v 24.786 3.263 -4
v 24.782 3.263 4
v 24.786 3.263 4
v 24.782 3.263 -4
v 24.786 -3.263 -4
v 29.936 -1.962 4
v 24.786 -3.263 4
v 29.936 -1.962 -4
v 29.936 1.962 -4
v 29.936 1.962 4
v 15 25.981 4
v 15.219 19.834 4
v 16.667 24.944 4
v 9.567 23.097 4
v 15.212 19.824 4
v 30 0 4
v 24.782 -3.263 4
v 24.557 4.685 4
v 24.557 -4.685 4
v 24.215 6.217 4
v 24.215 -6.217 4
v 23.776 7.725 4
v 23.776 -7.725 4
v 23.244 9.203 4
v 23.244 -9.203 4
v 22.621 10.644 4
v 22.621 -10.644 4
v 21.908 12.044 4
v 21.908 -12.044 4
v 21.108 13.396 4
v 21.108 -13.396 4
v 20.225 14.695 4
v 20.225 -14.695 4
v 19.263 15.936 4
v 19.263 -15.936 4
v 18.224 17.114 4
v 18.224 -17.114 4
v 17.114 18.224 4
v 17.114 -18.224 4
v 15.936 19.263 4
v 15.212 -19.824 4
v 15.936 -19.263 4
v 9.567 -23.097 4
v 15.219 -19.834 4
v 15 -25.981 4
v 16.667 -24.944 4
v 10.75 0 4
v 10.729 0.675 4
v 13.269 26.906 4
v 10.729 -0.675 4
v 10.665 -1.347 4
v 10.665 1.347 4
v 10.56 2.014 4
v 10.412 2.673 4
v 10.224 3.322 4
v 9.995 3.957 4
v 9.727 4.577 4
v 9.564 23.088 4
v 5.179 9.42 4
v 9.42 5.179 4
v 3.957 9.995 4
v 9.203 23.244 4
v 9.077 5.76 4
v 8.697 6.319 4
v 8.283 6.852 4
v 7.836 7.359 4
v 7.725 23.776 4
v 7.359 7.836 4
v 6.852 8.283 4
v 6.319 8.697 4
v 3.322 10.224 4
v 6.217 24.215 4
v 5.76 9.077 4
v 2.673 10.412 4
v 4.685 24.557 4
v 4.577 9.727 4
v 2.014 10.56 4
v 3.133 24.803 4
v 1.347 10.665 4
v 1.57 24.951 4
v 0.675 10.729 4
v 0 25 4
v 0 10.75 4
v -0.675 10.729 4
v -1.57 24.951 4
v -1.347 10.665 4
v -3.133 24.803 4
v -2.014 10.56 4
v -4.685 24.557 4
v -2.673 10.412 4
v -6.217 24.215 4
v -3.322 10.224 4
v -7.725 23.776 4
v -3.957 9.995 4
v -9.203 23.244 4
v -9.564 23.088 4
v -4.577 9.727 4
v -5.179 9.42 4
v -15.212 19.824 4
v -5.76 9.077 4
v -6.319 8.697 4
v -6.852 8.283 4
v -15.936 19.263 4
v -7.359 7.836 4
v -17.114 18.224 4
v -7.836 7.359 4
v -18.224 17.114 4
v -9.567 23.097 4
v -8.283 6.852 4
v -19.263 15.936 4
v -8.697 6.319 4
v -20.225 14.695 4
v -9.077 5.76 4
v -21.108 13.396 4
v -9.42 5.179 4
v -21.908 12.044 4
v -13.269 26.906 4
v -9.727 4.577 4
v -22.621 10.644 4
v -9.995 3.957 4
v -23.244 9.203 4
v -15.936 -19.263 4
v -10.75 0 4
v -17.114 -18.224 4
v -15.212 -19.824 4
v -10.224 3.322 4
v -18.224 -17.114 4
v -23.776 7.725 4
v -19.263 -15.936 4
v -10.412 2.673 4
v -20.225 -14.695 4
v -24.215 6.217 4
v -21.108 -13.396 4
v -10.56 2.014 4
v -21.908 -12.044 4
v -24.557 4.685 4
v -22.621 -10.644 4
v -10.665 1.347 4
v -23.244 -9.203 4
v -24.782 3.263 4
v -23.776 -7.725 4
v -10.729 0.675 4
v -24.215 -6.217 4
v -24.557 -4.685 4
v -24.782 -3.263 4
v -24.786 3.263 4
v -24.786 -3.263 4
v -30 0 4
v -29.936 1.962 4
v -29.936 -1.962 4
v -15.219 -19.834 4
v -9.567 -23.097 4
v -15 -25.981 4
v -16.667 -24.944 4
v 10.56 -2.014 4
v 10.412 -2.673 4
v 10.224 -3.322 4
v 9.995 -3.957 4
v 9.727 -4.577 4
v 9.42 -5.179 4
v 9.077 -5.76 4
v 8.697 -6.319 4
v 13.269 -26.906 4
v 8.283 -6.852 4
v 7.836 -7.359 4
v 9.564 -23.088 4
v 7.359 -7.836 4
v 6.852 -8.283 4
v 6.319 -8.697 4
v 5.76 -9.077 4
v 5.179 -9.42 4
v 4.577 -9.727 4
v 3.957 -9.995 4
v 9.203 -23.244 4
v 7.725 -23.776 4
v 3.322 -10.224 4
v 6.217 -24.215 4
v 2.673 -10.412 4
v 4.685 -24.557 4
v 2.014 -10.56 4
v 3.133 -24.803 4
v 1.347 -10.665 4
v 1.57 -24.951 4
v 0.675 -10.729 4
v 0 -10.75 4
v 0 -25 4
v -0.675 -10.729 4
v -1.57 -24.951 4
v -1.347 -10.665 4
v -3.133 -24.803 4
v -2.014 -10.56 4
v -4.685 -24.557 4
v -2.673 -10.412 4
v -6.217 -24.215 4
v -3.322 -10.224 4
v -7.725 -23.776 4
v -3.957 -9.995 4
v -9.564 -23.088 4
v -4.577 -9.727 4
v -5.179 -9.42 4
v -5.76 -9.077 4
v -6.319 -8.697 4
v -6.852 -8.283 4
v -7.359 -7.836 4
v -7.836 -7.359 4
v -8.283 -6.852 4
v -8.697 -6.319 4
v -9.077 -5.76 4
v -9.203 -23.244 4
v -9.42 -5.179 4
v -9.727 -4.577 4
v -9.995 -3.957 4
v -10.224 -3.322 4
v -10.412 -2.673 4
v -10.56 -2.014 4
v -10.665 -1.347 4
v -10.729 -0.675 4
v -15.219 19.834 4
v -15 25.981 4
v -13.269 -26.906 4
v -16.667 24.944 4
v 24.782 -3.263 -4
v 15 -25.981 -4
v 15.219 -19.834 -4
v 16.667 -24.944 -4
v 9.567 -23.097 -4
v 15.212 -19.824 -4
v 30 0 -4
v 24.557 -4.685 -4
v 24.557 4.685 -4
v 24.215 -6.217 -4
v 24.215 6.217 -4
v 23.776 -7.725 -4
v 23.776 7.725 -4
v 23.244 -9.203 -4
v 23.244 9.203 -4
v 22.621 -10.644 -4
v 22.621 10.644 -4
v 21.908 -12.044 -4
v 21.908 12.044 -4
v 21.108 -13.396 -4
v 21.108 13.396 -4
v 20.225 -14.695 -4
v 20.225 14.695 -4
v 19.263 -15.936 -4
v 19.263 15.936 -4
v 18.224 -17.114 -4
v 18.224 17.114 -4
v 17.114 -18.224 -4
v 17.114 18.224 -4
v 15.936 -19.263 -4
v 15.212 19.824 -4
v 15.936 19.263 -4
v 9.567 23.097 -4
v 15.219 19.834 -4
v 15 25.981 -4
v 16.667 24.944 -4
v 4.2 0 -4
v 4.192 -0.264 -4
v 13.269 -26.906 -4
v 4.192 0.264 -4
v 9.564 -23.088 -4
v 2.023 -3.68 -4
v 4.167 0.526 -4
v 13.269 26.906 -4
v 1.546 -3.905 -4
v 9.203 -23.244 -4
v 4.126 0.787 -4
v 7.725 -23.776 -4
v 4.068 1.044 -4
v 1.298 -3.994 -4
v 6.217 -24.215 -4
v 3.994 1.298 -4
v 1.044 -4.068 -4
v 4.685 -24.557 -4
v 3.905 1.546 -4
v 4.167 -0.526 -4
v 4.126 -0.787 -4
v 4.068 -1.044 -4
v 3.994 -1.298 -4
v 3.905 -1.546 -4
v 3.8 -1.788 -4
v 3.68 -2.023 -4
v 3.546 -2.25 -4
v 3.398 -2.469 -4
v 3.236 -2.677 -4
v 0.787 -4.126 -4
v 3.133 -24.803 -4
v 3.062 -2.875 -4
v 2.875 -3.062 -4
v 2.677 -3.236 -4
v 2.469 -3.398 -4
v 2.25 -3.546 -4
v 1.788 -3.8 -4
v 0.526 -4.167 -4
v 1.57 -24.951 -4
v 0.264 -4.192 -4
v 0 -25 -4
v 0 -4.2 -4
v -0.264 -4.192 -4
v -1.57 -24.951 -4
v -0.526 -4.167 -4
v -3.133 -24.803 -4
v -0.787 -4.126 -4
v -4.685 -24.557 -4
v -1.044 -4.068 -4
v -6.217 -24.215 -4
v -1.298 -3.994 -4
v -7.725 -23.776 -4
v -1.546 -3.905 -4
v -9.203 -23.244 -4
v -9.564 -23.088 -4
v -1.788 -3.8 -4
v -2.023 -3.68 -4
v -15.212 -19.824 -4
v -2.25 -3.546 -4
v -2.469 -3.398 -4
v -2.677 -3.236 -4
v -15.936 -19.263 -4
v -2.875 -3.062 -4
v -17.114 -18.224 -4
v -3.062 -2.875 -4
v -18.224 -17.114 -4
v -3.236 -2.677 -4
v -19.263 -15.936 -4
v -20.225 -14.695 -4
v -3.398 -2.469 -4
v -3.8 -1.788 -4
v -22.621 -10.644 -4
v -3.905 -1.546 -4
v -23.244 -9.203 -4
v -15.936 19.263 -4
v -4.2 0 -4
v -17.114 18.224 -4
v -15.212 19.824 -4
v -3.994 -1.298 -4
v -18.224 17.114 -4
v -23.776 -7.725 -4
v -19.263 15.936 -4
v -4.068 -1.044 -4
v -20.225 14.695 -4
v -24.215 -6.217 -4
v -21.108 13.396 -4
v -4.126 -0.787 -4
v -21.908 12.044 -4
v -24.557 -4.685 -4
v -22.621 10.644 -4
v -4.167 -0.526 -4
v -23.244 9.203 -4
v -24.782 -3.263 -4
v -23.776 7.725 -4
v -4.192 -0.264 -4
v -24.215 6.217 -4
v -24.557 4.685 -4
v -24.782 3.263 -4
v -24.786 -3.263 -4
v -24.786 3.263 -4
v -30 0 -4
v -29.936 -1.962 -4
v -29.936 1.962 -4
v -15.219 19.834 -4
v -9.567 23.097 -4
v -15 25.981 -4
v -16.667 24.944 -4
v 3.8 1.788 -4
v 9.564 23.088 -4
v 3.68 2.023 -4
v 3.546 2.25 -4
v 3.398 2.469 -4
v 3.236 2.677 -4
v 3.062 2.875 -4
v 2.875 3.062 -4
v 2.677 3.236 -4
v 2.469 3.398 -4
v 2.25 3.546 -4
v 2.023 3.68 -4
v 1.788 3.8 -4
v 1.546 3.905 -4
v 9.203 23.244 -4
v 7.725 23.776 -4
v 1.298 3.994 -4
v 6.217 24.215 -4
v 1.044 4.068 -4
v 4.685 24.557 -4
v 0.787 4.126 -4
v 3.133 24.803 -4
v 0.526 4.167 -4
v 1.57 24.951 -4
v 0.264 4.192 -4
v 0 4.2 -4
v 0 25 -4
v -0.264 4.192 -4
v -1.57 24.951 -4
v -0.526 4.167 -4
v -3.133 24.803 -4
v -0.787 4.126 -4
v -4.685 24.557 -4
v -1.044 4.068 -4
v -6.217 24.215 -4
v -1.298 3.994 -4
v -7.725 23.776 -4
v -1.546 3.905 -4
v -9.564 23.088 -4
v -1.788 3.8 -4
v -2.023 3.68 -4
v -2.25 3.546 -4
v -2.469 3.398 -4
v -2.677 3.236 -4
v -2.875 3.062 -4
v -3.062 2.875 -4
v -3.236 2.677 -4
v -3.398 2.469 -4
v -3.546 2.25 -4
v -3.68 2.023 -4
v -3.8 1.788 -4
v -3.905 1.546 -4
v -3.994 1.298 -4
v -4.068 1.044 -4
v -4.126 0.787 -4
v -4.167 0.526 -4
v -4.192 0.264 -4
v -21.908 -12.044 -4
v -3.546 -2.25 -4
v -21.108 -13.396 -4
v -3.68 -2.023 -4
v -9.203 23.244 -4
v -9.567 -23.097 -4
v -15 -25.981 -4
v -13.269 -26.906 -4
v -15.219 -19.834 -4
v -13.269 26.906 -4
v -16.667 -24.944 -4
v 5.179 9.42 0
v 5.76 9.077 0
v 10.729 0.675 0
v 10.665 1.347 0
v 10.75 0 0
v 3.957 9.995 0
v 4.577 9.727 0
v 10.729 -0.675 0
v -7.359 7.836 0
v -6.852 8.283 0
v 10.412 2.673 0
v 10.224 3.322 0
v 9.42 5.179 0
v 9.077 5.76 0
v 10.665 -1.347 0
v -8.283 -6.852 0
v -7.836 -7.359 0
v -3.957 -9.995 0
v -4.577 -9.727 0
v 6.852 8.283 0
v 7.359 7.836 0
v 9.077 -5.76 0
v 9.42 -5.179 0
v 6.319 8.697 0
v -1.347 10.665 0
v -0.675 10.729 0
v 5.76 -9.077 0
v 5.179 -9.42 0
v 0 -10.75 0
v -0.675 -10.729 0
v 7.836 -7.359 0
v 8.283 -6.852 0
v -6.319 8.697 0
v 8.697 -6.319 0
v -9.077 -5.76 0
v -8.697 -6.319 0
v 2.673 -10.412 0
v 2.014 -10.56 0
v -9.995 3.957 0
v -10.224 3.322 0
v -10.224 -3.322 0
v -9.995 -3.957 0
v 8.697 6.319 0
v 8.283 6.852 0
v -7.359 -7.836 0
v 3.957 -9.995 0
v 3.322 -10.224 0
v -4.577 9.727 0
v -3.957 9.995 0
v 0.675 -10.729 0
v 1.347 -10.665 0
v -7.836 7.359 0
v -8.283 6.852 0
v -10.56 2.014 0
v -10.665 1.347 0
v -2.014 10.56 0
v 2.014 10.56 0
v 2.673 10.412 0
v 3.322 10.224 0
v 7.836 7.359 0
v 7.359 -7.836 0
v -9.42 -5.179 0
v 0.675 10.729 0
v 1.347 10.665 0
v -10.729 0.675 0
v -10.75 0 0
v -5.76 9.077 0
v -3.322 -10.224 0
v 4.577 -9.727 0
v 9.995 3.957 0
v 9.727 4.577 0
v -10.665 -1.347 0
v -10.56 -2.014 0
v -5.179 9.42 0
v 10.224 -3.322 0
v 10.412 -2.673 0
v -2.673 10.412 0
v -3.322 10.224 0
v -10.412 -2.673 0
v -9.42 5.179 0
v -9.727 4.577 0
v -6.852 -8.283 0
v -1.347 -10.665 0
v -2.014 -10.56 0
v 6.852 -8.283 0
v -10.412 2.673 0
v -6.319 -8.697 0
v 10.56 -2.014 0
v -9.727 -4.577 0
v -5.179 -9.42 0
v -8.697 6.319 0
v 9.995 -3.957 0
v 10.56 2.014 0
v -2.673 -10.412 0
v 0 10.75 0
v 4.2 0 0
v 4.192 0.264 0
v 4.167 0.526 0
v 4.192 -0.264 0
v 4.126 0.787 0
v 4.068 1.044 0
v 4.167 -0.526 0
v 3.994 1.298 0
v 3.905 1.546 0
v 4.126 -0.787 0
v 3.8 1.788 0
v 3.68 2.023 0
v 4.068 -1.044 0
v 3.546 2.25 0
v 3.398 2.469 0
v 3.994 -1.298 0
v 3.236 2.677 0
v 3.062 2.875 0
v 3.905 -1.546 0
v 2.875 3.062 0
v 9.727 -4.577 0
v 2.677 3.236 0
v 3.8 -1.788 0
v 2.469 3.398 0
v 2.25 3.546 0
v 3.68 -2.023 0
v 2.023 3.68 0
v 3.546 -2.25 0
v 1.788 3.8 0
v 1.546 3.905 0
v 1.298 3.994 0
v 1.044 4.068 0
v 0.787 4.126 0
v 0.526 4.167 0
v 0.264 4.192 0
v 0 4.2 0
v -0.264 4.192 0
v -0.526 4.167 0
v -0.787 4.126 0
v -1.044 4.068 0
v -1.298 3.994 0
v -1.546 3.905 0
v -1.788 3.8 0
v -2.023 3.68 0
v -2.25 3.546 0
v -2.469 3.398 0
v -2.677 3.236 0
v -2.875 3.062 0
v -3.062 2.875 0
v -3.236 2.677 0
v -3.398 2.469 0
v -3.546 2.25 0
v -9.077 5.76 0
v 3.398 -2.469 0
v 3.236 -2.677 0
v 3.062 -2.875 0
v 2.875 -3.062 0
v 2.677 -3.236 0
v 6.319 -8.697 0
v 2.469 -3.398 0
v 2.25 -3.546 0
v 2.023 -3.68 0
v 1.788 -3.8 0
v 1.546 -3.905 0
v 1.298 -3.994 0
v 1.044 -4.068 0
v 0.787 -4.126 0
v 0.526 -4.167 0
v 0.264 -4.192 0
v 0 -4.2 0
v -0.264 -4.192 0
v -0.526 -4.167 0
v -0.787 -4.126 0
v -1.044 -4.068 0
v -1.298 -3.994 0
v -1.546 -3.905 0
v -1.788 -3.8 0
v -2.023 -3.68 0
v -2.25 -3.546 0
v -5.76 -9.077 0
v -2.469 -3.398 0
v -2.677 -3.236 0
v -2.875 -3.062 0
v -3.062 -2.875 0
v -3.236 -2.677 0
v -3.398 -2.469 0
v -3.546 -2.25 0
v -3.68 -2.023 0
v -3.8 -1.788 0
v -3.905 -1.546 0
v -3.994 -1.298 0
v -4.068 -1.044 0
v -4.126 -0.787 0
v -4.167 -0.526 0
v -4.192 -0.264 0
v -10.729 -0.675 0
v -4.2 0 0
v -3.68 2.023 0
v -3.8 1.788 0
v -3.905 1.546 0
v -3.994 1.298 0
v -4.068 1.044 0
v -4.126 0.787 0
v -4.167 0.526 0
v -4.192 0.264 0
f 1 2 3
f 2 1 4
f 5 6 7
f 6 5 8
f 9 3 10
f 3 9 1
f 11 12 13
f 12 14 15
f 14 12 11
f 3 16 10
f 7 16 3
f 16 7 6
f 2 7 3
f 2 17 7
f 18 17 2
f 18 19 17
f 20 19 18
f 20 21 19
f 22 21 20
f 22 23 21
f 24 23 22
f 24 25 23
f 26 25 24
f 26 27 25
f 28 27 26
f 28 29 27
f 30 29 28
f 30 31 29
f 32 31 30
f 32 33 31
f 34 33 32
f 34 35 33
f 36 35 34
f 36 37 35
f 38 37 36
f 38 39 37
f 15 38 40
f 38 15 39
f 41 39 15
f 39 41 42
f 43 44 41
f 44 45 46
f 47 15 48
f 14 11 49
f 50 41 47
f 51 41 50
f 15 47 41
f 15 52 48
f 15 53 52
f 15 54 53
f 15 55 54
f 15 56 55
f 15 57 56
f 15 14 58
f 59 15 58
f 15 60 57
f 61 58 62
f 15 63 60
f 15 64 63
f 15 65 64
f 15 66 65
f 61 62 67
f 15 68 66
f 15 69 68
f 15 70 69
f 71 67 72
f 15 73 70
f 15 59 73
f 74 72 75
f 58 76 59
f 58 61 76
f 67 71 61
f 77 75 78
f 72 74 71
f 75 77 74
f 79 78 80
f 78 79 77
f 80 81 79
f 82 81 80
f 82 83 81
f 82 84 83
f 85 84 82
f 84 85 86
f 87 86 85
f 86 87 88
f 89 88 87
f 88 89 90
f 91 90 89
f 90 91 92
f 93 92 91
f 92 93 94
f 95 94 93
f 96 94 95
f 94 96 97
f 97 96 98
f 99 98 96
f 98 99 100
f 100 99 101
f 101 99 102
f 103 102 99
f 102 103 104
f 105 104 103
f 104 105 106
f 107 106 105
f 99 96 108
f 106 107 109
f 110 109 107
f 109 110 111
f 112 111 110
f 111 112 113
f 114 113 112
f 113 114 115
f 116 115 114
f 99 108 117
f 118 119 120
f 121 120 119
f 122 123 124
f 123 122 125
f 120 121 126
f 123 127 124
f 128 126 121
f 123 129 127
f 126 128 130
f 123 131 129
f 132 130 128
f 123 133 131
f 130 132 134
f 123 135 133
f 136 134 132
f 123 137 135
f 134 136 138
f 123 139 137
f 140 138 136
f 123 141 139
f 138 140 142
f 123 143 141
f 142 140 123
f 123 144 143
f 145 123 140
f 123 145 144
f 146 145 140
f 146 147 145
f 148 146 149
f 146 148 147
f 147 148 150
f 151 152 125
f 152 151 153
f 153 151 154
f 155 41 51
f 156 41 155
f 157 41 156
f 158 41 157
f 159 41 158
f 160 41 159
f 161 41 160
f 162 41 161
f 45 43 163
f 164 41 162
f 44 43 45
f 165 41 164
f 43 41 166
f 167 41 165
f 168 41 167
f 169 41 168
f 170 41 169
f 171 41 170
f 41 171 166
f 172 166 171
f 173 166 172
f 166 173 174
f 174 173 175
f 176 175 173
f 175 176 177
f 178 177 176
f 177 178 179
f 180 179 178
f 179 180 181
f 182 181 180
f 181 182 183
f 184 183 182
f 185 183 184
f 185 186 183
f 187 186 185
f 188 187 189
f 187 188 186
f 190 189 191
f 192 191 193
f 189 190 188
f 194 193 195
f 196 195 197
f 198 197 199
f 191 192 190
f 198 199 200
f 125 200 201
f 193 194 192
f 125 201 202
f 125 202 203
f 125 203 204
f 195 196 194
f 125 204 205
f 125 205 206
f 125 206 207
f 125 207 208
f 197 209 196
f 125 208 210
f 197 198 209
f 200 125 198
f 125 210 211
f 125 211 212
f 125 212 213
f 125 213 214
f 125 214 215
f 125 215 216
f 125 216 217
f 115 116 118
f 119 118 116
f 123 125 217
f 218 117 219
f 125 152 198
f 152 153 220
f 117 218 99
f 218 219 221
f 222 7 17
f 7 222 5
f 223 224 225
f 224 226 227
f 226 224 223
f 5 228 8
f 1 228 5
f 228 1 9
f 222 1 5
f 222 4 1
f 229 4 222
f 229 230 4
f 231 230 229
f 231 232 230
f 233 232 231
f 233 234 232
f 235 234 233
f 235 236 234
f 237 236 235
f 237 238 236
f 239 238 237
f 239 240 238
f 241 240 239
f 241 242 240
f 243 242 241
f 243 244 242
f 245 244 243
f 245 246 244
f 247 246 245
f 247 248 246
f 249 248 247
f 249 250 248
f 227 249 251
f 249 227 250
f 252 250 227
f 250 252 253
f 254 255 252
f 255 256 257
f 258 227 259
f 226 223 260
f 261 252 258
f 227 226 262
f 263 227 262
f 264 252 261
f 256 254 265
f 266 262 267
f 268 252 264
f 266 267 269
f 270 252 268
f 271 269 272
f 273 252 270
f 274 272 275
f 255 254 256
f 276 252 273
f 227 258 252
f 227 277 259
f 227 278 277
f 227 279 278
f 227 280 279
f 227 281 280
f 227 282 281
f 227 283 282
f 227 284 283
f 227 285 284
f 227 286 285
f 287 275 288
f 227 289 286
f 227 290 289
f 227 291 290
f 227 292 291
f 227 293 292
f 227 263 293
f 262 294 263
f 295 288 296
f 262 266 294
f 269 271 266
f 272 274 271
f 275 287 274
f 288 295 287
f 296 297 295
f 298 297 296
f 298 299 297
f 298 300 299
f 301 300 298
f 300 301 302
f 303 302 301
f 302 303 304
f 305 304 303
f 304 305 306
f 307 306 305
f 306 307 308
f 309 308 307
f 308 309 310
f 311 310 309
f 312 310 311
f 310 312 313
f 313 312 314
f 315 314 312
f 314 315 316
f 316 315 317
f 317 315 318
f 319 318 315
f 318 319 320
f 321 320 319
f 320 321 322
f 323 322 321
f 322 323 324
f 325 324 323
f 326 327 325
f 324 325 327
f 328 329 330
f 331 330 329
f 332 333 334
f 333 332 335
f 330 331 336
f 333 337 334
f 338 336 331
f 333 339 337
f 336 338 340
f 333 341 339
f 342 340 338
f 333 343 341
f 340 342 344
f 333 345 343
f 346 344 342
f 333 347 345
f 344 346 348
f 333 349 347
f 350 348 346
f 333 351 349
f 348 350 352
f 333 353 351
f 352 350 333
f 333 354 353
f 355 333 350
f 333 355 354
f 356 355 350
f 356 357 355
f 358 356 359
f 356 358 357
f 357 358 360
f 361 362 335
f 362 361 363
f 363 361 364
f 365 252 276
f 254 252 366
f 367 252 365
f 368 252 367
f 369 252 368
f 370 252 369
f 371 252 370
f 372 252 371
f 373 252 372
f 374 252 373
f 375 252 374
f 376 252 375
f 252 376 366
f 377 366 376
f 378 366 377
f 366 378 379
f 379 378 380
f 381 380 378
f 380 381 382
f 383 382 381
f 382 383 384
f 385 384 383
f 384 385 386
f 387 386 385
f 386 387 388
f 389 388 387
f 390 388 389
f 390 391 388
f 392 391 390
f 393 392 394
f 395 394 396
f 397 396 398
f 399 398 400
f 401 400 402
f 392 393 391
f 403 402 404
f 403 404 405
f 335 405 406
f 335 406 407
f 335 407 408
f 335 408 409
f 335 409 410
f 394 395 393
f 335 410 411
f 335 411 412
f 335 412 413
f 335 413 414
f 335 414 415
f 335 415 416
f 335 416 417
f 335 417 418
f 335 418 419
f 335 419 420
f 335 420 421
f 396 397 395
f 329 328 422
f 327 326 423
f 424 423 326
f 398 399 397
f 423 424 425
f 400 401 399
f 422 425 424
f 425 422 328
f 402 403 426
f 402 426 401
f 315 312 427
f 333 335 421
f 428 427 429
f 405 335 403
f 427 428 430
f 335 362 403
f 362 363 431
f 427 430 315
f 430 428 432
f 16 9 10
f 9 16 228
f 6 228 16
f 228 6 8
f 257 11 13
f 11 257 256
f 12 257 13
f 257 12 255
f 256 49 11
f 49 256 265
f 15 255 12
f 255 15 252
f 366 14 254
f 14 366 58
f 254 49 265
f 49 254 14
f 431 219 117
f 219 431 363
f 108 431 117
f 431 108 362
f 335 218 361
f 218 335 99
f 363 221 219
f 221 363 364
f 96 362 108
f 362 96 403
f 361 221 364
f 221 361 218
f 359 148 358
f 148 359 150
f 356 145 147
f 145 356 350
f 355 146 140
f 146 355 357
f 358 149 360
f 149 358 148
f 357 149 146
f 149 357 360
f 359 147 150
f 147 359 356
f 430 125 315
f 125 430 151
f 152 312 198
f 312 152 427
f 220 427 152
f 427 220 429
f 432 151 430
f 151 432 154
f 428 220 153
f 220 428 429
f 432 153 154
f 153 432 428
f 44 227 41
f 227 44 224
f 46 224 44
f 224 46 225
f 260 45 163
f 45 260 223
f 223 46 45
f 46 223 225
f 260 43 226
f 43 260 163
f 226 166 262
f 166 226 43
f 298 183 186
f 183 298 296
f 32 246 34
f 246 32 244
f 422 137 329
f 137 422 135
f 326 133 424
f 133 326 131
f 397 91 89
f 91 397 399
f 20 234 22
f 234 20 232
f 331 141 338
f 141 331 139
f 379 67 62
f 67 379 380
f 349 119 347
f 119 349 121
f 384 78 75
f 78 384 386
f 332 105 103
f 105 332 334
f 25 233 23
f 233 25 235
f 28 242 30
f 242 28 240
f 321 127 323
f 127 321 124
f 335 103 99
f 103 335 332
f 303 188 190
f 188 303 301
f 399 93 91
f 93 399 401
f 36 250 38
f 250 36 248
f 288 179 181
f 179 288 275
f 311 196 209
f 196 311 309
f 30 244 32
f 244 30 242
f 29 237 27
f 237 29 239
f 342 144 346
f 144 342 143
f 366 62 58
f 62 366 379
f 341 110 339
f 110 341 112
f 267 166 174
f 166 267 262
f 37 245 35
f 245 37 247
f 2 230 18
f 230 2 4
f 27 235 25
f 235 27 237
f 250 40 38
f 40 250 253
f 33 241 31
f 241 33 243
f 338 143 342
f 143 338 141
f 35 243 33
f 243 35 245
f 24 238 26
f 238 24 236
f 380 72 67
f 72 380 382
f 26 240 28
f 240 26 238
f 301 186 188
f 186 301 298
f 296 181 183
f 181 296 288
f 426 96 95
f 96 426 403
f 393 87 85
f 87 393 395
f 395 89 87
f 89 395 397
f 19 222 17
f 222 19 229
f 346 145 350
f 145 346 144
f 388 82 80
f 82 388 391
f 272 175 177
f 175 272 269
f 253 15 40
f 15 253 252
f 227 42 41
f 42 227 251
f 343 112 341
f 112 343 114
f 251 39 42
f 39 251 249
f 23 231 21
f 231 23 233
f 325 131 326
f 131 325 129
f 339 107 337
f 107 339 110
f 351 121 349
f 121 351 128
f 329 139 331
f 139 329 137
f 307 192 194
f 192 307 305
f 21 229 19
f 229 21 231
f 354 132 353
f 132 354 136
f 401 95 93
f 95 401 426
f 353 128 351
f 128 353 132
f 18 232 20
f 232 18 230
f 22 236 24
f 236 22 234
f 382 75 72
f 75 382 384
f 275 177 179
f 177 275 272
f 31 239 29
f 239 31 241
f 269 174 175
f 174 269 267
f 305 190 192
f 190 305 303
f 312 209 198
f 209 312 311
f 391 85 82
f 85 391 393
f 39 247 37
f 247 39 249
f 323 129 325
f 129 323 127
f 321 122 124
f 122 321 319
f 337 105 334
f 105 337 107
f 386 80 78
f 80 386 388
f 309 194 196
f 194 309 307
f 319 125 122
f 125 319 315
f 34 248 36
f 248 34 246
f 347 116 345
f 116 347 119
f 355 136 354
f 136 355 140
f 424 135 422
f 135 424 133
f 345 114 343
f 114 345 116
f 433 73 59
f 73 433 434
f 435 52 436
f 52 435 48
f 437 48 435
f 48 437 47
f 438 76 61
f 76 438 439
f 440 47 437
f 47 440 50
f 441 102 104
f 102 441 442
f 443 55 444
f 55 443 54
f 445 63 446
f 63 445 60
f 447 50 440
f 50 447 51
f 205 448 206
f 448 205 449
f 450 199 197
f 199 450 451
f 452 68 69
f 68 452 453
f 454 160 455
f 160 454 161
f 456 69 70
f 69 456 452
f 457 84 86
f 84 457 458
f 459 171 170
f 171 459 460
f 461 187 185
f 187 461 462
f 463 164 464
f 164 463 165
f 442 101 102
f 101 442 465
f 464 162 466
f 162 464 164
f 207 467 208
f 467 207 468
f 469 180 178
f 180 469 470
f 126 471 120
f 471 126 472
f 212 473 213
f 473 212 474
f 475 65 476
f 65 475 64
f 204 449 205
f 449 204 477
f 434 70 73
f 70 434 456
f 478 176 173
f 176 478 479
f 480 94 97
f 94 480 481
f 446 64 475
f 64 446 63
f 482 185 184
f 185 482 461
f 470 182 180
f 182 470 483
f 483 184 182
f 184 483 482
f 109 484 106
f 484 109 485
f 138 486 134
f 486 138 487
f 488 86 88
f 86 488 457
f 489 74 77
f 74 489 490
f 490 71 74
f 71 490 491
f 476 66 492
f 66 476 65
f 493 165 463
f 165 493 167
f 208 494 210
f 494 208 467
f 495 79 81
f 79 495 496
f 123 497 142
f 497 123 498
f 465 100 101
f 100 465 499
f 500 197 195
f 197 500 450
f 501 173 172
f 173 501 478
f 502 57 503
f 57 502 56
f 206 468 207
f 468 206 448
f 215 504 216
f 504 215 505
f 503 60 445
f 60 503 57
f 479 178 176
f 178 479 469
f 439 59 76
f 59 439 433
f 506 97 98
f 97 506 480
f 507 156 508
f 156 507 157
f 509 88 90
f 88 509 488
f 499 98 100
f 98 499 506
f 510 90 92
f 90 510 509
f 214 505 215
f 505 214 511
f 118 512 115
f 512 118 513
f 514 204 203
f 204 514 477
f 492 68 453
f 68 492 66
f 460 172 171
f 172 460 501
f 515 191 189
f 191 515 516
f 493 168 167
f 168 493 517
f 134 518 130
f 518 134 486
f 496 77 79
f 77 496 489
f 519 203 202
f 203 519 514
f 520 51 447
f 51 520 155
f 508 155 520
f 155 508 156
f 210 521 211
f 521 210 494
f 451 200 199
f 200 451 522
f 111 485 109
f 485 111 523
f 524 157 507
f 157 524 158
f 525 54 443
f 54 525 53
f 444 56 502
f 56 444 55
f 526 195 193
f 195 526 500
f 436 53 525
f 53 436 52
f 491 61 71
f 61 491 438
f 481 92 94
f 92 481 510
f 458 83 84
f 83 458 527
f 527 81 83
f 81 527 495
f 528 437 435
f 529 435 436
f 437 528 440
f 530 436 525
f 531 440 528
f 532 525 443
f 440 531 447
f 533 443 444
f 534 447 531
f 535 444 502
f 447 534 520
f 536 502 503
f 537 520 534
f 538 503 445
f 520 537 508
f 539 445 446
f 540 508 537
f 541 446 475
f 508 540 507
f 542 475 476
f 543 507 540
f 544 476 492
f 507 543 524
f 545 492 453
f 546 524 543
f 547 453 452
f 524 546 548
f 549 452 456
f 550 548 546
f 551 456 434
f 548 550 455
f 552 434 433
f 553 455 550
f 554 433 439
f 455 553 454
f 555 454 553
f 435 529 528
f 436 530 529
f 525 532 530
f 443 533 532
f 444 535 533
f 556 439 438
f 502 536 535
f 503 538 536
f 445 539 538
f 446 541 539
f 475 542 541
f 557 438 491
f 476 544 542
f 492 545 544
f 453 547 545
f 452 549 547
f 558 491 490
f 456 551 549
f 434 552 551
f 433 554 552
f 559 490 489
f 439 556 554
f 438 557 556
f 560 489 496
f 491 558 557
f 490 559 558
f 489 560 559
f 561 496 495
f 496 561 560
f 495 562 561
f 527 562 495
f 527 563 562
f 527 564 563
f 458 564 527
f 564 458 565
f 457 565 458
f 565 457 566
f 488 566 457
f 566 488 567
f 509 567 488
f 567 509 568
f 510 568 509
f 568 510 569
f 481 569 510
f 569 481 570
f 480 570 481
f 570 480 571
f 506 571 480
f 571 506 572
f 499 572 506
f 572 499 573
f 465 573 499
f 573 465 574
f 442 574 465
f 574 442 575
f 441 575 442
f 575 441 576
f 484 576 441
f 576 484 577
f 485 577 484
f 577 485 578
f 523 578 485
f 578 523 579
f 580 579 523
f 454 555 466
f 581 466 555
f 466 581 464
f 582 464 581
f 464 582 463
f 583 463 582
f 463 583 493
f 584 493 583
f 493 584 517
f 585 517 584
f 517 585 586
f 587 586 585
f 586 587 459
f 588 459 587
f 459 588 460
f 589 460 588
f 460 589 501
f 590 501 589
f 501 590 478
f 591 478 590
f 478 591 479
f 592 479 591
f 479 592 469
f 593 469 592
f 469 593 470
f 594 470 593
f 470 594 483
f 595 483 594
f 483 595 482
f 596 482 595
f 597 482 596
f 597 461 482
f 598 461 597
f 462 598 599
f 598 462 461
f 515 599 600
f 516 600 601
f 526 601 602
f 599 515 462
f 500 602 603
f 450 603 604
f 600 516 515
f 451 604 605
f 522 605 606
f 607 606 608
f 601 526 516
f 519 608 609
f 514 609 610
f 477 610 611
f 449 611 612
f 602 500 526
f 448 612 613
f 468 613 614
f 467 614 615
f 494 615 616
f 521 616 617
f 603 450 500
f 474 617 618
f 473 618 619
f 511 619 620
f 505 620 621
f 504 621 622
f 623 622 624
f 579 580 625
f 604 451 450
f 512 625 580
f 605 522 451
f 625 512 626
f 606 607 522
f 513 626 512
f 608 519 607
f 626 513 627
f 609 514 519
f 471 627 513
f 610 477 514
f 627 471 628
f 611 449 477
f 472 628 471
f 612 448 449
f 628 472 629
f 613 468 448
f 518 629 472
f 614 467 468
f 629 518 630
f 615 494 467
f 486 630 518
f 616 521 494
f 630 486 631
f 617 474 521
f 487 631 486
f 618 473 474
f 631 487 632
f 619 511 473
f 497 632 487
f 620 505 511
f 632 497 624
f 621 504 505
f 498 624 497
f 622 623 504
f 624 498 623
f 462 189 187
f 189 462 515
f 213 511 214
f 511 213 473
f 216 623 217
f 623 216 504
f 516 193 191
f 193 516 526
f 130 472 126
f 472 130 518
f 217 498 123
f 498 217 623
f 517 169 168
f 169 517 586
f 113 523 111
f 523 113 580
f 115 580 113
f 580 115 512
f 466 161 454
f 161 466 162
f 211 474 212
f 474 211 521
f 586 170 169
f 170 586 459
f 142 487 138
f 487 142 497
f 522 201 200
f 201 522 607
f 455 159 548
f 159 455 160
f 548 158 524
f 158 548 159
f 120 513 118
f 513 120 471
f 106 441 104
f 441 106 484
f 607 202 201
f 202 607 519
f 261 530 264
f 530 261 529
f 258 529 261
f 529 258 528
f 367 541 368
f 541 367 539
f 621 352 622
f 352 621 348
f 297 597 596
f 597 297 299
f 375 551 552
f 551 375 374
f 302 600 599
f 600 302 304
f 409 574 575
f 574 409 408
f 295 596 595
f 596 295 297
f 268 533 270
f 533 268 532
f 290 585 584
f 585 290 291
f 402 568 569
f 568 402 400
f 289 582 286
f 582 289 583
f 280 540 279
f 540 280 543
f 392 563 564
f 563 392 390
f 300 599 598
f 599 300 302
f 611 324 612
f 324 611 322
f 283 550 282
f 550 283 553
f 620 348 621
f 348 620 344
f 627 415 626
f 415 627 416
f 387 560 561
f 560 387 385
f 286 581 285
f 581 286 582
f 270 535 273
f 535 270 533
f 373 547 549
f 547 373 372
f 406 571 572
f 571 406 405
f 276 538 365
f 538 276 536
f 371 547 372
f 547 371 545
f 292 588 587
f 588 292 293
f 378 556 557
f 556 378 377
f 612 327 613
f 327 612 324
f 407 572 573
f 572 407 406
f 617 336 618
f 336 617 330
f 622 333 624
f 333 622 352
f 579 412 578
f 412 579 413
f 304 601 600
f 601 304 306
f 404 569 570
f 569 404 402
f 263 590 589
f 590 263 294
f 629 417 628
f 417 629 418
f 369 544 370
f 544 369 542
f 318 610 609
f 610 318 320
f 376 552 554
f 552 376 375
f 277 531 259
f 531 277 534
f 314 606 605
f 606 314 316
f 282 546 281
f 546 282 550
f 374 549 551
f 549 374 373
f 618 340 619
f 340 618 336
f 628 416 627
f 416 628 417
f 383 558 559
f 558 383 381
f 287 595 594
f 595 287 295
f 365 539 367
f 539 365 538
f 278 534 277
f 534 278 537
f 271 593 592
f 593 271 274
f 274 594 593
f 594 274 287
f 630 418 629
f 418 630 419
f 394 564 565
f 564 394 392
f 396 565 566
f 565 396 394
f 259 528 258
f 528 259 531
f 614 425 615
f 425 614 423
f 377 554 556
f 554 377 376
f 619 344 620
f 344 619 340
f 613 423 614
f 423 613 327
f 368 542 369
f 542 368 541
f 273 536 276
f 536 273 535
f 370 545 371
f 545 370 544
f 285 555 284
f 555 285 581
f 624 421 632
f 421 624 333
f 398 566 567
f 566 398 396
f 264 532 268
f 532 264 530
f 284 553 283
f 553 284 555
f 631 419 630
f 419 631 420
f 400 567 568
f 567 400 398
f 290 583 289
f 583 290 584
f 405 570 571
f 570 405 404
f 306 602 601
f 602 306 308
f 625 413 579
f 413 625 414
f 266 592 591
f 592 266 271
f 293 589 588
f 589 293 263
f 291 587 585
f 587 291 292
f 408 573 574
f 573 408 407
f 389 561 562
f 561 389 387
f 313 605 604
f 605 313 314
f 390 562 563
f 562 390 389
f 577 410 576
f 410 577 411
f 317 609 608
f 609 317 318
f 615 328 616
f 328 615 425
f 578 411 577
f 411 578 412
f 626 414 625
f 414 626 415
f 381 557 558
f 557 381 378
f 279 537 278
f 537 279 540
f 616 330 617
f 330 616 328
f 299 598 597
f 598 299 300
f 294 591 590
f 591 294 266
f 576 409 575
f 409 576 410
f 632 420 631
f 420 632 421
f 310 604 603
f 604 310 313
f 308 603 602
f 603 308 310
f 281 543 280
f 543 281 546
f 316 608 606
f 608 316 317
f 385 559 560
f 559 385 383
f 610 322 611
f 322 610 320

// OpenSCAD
//	PARAMETRIC GEAR WHEELS

//		Parameters
//
//	re= external radius
//	ri= internal radius
//	n=number of gears the wheel has
//	d=parameter to control the separation between gears
//	h=height of the wheel

module gear_wheel(re,ri,n,d)
{
	// Angle difference between middle points of gears
	am=360/n;

	// Angle difference between middle and ending points of gears
	ad=360/((d+1)*n*4);

	// Drawing gears

	for (i=[0:n-1])
	 linear_extrude(height = h, center = true, convexity = 10, twist = 0)
	 polygon(
		points=[
			[0,0],
			[ri*cos(am*i-2*ad),ri*sin(am*i-2*ad)],
			[re*cos(am*i-ad),re*sin(am*i-ad)],
			[re*cos(am*i),re*sin(am*i)],
			[re*cos(am*i+ad),re*sin(am*i+ad)],
			[ri*cos(am*i+2*ad),ri*sin(am*i+2*ad)]
			 ],
		paths=[[0,1,2,3,4,5]]);

	// Drawing internal circle

	cylinder(r=ri,h=h,center=true,$fn=100);








}


// example of use

difference()
{
	gear_wheel(re=30,ri=25,n=6,d=3,h=8);

	union(){
//-- Carved cicle for the Futaba plate
    translate([0,0,10]) cylinder(r=21.5/2, center=true,h=20,$fn=100);

    //-- Carved circle por the Futaba shart
    cylinder(center=true, h=30, r=4.2,$fn=100);
}}
